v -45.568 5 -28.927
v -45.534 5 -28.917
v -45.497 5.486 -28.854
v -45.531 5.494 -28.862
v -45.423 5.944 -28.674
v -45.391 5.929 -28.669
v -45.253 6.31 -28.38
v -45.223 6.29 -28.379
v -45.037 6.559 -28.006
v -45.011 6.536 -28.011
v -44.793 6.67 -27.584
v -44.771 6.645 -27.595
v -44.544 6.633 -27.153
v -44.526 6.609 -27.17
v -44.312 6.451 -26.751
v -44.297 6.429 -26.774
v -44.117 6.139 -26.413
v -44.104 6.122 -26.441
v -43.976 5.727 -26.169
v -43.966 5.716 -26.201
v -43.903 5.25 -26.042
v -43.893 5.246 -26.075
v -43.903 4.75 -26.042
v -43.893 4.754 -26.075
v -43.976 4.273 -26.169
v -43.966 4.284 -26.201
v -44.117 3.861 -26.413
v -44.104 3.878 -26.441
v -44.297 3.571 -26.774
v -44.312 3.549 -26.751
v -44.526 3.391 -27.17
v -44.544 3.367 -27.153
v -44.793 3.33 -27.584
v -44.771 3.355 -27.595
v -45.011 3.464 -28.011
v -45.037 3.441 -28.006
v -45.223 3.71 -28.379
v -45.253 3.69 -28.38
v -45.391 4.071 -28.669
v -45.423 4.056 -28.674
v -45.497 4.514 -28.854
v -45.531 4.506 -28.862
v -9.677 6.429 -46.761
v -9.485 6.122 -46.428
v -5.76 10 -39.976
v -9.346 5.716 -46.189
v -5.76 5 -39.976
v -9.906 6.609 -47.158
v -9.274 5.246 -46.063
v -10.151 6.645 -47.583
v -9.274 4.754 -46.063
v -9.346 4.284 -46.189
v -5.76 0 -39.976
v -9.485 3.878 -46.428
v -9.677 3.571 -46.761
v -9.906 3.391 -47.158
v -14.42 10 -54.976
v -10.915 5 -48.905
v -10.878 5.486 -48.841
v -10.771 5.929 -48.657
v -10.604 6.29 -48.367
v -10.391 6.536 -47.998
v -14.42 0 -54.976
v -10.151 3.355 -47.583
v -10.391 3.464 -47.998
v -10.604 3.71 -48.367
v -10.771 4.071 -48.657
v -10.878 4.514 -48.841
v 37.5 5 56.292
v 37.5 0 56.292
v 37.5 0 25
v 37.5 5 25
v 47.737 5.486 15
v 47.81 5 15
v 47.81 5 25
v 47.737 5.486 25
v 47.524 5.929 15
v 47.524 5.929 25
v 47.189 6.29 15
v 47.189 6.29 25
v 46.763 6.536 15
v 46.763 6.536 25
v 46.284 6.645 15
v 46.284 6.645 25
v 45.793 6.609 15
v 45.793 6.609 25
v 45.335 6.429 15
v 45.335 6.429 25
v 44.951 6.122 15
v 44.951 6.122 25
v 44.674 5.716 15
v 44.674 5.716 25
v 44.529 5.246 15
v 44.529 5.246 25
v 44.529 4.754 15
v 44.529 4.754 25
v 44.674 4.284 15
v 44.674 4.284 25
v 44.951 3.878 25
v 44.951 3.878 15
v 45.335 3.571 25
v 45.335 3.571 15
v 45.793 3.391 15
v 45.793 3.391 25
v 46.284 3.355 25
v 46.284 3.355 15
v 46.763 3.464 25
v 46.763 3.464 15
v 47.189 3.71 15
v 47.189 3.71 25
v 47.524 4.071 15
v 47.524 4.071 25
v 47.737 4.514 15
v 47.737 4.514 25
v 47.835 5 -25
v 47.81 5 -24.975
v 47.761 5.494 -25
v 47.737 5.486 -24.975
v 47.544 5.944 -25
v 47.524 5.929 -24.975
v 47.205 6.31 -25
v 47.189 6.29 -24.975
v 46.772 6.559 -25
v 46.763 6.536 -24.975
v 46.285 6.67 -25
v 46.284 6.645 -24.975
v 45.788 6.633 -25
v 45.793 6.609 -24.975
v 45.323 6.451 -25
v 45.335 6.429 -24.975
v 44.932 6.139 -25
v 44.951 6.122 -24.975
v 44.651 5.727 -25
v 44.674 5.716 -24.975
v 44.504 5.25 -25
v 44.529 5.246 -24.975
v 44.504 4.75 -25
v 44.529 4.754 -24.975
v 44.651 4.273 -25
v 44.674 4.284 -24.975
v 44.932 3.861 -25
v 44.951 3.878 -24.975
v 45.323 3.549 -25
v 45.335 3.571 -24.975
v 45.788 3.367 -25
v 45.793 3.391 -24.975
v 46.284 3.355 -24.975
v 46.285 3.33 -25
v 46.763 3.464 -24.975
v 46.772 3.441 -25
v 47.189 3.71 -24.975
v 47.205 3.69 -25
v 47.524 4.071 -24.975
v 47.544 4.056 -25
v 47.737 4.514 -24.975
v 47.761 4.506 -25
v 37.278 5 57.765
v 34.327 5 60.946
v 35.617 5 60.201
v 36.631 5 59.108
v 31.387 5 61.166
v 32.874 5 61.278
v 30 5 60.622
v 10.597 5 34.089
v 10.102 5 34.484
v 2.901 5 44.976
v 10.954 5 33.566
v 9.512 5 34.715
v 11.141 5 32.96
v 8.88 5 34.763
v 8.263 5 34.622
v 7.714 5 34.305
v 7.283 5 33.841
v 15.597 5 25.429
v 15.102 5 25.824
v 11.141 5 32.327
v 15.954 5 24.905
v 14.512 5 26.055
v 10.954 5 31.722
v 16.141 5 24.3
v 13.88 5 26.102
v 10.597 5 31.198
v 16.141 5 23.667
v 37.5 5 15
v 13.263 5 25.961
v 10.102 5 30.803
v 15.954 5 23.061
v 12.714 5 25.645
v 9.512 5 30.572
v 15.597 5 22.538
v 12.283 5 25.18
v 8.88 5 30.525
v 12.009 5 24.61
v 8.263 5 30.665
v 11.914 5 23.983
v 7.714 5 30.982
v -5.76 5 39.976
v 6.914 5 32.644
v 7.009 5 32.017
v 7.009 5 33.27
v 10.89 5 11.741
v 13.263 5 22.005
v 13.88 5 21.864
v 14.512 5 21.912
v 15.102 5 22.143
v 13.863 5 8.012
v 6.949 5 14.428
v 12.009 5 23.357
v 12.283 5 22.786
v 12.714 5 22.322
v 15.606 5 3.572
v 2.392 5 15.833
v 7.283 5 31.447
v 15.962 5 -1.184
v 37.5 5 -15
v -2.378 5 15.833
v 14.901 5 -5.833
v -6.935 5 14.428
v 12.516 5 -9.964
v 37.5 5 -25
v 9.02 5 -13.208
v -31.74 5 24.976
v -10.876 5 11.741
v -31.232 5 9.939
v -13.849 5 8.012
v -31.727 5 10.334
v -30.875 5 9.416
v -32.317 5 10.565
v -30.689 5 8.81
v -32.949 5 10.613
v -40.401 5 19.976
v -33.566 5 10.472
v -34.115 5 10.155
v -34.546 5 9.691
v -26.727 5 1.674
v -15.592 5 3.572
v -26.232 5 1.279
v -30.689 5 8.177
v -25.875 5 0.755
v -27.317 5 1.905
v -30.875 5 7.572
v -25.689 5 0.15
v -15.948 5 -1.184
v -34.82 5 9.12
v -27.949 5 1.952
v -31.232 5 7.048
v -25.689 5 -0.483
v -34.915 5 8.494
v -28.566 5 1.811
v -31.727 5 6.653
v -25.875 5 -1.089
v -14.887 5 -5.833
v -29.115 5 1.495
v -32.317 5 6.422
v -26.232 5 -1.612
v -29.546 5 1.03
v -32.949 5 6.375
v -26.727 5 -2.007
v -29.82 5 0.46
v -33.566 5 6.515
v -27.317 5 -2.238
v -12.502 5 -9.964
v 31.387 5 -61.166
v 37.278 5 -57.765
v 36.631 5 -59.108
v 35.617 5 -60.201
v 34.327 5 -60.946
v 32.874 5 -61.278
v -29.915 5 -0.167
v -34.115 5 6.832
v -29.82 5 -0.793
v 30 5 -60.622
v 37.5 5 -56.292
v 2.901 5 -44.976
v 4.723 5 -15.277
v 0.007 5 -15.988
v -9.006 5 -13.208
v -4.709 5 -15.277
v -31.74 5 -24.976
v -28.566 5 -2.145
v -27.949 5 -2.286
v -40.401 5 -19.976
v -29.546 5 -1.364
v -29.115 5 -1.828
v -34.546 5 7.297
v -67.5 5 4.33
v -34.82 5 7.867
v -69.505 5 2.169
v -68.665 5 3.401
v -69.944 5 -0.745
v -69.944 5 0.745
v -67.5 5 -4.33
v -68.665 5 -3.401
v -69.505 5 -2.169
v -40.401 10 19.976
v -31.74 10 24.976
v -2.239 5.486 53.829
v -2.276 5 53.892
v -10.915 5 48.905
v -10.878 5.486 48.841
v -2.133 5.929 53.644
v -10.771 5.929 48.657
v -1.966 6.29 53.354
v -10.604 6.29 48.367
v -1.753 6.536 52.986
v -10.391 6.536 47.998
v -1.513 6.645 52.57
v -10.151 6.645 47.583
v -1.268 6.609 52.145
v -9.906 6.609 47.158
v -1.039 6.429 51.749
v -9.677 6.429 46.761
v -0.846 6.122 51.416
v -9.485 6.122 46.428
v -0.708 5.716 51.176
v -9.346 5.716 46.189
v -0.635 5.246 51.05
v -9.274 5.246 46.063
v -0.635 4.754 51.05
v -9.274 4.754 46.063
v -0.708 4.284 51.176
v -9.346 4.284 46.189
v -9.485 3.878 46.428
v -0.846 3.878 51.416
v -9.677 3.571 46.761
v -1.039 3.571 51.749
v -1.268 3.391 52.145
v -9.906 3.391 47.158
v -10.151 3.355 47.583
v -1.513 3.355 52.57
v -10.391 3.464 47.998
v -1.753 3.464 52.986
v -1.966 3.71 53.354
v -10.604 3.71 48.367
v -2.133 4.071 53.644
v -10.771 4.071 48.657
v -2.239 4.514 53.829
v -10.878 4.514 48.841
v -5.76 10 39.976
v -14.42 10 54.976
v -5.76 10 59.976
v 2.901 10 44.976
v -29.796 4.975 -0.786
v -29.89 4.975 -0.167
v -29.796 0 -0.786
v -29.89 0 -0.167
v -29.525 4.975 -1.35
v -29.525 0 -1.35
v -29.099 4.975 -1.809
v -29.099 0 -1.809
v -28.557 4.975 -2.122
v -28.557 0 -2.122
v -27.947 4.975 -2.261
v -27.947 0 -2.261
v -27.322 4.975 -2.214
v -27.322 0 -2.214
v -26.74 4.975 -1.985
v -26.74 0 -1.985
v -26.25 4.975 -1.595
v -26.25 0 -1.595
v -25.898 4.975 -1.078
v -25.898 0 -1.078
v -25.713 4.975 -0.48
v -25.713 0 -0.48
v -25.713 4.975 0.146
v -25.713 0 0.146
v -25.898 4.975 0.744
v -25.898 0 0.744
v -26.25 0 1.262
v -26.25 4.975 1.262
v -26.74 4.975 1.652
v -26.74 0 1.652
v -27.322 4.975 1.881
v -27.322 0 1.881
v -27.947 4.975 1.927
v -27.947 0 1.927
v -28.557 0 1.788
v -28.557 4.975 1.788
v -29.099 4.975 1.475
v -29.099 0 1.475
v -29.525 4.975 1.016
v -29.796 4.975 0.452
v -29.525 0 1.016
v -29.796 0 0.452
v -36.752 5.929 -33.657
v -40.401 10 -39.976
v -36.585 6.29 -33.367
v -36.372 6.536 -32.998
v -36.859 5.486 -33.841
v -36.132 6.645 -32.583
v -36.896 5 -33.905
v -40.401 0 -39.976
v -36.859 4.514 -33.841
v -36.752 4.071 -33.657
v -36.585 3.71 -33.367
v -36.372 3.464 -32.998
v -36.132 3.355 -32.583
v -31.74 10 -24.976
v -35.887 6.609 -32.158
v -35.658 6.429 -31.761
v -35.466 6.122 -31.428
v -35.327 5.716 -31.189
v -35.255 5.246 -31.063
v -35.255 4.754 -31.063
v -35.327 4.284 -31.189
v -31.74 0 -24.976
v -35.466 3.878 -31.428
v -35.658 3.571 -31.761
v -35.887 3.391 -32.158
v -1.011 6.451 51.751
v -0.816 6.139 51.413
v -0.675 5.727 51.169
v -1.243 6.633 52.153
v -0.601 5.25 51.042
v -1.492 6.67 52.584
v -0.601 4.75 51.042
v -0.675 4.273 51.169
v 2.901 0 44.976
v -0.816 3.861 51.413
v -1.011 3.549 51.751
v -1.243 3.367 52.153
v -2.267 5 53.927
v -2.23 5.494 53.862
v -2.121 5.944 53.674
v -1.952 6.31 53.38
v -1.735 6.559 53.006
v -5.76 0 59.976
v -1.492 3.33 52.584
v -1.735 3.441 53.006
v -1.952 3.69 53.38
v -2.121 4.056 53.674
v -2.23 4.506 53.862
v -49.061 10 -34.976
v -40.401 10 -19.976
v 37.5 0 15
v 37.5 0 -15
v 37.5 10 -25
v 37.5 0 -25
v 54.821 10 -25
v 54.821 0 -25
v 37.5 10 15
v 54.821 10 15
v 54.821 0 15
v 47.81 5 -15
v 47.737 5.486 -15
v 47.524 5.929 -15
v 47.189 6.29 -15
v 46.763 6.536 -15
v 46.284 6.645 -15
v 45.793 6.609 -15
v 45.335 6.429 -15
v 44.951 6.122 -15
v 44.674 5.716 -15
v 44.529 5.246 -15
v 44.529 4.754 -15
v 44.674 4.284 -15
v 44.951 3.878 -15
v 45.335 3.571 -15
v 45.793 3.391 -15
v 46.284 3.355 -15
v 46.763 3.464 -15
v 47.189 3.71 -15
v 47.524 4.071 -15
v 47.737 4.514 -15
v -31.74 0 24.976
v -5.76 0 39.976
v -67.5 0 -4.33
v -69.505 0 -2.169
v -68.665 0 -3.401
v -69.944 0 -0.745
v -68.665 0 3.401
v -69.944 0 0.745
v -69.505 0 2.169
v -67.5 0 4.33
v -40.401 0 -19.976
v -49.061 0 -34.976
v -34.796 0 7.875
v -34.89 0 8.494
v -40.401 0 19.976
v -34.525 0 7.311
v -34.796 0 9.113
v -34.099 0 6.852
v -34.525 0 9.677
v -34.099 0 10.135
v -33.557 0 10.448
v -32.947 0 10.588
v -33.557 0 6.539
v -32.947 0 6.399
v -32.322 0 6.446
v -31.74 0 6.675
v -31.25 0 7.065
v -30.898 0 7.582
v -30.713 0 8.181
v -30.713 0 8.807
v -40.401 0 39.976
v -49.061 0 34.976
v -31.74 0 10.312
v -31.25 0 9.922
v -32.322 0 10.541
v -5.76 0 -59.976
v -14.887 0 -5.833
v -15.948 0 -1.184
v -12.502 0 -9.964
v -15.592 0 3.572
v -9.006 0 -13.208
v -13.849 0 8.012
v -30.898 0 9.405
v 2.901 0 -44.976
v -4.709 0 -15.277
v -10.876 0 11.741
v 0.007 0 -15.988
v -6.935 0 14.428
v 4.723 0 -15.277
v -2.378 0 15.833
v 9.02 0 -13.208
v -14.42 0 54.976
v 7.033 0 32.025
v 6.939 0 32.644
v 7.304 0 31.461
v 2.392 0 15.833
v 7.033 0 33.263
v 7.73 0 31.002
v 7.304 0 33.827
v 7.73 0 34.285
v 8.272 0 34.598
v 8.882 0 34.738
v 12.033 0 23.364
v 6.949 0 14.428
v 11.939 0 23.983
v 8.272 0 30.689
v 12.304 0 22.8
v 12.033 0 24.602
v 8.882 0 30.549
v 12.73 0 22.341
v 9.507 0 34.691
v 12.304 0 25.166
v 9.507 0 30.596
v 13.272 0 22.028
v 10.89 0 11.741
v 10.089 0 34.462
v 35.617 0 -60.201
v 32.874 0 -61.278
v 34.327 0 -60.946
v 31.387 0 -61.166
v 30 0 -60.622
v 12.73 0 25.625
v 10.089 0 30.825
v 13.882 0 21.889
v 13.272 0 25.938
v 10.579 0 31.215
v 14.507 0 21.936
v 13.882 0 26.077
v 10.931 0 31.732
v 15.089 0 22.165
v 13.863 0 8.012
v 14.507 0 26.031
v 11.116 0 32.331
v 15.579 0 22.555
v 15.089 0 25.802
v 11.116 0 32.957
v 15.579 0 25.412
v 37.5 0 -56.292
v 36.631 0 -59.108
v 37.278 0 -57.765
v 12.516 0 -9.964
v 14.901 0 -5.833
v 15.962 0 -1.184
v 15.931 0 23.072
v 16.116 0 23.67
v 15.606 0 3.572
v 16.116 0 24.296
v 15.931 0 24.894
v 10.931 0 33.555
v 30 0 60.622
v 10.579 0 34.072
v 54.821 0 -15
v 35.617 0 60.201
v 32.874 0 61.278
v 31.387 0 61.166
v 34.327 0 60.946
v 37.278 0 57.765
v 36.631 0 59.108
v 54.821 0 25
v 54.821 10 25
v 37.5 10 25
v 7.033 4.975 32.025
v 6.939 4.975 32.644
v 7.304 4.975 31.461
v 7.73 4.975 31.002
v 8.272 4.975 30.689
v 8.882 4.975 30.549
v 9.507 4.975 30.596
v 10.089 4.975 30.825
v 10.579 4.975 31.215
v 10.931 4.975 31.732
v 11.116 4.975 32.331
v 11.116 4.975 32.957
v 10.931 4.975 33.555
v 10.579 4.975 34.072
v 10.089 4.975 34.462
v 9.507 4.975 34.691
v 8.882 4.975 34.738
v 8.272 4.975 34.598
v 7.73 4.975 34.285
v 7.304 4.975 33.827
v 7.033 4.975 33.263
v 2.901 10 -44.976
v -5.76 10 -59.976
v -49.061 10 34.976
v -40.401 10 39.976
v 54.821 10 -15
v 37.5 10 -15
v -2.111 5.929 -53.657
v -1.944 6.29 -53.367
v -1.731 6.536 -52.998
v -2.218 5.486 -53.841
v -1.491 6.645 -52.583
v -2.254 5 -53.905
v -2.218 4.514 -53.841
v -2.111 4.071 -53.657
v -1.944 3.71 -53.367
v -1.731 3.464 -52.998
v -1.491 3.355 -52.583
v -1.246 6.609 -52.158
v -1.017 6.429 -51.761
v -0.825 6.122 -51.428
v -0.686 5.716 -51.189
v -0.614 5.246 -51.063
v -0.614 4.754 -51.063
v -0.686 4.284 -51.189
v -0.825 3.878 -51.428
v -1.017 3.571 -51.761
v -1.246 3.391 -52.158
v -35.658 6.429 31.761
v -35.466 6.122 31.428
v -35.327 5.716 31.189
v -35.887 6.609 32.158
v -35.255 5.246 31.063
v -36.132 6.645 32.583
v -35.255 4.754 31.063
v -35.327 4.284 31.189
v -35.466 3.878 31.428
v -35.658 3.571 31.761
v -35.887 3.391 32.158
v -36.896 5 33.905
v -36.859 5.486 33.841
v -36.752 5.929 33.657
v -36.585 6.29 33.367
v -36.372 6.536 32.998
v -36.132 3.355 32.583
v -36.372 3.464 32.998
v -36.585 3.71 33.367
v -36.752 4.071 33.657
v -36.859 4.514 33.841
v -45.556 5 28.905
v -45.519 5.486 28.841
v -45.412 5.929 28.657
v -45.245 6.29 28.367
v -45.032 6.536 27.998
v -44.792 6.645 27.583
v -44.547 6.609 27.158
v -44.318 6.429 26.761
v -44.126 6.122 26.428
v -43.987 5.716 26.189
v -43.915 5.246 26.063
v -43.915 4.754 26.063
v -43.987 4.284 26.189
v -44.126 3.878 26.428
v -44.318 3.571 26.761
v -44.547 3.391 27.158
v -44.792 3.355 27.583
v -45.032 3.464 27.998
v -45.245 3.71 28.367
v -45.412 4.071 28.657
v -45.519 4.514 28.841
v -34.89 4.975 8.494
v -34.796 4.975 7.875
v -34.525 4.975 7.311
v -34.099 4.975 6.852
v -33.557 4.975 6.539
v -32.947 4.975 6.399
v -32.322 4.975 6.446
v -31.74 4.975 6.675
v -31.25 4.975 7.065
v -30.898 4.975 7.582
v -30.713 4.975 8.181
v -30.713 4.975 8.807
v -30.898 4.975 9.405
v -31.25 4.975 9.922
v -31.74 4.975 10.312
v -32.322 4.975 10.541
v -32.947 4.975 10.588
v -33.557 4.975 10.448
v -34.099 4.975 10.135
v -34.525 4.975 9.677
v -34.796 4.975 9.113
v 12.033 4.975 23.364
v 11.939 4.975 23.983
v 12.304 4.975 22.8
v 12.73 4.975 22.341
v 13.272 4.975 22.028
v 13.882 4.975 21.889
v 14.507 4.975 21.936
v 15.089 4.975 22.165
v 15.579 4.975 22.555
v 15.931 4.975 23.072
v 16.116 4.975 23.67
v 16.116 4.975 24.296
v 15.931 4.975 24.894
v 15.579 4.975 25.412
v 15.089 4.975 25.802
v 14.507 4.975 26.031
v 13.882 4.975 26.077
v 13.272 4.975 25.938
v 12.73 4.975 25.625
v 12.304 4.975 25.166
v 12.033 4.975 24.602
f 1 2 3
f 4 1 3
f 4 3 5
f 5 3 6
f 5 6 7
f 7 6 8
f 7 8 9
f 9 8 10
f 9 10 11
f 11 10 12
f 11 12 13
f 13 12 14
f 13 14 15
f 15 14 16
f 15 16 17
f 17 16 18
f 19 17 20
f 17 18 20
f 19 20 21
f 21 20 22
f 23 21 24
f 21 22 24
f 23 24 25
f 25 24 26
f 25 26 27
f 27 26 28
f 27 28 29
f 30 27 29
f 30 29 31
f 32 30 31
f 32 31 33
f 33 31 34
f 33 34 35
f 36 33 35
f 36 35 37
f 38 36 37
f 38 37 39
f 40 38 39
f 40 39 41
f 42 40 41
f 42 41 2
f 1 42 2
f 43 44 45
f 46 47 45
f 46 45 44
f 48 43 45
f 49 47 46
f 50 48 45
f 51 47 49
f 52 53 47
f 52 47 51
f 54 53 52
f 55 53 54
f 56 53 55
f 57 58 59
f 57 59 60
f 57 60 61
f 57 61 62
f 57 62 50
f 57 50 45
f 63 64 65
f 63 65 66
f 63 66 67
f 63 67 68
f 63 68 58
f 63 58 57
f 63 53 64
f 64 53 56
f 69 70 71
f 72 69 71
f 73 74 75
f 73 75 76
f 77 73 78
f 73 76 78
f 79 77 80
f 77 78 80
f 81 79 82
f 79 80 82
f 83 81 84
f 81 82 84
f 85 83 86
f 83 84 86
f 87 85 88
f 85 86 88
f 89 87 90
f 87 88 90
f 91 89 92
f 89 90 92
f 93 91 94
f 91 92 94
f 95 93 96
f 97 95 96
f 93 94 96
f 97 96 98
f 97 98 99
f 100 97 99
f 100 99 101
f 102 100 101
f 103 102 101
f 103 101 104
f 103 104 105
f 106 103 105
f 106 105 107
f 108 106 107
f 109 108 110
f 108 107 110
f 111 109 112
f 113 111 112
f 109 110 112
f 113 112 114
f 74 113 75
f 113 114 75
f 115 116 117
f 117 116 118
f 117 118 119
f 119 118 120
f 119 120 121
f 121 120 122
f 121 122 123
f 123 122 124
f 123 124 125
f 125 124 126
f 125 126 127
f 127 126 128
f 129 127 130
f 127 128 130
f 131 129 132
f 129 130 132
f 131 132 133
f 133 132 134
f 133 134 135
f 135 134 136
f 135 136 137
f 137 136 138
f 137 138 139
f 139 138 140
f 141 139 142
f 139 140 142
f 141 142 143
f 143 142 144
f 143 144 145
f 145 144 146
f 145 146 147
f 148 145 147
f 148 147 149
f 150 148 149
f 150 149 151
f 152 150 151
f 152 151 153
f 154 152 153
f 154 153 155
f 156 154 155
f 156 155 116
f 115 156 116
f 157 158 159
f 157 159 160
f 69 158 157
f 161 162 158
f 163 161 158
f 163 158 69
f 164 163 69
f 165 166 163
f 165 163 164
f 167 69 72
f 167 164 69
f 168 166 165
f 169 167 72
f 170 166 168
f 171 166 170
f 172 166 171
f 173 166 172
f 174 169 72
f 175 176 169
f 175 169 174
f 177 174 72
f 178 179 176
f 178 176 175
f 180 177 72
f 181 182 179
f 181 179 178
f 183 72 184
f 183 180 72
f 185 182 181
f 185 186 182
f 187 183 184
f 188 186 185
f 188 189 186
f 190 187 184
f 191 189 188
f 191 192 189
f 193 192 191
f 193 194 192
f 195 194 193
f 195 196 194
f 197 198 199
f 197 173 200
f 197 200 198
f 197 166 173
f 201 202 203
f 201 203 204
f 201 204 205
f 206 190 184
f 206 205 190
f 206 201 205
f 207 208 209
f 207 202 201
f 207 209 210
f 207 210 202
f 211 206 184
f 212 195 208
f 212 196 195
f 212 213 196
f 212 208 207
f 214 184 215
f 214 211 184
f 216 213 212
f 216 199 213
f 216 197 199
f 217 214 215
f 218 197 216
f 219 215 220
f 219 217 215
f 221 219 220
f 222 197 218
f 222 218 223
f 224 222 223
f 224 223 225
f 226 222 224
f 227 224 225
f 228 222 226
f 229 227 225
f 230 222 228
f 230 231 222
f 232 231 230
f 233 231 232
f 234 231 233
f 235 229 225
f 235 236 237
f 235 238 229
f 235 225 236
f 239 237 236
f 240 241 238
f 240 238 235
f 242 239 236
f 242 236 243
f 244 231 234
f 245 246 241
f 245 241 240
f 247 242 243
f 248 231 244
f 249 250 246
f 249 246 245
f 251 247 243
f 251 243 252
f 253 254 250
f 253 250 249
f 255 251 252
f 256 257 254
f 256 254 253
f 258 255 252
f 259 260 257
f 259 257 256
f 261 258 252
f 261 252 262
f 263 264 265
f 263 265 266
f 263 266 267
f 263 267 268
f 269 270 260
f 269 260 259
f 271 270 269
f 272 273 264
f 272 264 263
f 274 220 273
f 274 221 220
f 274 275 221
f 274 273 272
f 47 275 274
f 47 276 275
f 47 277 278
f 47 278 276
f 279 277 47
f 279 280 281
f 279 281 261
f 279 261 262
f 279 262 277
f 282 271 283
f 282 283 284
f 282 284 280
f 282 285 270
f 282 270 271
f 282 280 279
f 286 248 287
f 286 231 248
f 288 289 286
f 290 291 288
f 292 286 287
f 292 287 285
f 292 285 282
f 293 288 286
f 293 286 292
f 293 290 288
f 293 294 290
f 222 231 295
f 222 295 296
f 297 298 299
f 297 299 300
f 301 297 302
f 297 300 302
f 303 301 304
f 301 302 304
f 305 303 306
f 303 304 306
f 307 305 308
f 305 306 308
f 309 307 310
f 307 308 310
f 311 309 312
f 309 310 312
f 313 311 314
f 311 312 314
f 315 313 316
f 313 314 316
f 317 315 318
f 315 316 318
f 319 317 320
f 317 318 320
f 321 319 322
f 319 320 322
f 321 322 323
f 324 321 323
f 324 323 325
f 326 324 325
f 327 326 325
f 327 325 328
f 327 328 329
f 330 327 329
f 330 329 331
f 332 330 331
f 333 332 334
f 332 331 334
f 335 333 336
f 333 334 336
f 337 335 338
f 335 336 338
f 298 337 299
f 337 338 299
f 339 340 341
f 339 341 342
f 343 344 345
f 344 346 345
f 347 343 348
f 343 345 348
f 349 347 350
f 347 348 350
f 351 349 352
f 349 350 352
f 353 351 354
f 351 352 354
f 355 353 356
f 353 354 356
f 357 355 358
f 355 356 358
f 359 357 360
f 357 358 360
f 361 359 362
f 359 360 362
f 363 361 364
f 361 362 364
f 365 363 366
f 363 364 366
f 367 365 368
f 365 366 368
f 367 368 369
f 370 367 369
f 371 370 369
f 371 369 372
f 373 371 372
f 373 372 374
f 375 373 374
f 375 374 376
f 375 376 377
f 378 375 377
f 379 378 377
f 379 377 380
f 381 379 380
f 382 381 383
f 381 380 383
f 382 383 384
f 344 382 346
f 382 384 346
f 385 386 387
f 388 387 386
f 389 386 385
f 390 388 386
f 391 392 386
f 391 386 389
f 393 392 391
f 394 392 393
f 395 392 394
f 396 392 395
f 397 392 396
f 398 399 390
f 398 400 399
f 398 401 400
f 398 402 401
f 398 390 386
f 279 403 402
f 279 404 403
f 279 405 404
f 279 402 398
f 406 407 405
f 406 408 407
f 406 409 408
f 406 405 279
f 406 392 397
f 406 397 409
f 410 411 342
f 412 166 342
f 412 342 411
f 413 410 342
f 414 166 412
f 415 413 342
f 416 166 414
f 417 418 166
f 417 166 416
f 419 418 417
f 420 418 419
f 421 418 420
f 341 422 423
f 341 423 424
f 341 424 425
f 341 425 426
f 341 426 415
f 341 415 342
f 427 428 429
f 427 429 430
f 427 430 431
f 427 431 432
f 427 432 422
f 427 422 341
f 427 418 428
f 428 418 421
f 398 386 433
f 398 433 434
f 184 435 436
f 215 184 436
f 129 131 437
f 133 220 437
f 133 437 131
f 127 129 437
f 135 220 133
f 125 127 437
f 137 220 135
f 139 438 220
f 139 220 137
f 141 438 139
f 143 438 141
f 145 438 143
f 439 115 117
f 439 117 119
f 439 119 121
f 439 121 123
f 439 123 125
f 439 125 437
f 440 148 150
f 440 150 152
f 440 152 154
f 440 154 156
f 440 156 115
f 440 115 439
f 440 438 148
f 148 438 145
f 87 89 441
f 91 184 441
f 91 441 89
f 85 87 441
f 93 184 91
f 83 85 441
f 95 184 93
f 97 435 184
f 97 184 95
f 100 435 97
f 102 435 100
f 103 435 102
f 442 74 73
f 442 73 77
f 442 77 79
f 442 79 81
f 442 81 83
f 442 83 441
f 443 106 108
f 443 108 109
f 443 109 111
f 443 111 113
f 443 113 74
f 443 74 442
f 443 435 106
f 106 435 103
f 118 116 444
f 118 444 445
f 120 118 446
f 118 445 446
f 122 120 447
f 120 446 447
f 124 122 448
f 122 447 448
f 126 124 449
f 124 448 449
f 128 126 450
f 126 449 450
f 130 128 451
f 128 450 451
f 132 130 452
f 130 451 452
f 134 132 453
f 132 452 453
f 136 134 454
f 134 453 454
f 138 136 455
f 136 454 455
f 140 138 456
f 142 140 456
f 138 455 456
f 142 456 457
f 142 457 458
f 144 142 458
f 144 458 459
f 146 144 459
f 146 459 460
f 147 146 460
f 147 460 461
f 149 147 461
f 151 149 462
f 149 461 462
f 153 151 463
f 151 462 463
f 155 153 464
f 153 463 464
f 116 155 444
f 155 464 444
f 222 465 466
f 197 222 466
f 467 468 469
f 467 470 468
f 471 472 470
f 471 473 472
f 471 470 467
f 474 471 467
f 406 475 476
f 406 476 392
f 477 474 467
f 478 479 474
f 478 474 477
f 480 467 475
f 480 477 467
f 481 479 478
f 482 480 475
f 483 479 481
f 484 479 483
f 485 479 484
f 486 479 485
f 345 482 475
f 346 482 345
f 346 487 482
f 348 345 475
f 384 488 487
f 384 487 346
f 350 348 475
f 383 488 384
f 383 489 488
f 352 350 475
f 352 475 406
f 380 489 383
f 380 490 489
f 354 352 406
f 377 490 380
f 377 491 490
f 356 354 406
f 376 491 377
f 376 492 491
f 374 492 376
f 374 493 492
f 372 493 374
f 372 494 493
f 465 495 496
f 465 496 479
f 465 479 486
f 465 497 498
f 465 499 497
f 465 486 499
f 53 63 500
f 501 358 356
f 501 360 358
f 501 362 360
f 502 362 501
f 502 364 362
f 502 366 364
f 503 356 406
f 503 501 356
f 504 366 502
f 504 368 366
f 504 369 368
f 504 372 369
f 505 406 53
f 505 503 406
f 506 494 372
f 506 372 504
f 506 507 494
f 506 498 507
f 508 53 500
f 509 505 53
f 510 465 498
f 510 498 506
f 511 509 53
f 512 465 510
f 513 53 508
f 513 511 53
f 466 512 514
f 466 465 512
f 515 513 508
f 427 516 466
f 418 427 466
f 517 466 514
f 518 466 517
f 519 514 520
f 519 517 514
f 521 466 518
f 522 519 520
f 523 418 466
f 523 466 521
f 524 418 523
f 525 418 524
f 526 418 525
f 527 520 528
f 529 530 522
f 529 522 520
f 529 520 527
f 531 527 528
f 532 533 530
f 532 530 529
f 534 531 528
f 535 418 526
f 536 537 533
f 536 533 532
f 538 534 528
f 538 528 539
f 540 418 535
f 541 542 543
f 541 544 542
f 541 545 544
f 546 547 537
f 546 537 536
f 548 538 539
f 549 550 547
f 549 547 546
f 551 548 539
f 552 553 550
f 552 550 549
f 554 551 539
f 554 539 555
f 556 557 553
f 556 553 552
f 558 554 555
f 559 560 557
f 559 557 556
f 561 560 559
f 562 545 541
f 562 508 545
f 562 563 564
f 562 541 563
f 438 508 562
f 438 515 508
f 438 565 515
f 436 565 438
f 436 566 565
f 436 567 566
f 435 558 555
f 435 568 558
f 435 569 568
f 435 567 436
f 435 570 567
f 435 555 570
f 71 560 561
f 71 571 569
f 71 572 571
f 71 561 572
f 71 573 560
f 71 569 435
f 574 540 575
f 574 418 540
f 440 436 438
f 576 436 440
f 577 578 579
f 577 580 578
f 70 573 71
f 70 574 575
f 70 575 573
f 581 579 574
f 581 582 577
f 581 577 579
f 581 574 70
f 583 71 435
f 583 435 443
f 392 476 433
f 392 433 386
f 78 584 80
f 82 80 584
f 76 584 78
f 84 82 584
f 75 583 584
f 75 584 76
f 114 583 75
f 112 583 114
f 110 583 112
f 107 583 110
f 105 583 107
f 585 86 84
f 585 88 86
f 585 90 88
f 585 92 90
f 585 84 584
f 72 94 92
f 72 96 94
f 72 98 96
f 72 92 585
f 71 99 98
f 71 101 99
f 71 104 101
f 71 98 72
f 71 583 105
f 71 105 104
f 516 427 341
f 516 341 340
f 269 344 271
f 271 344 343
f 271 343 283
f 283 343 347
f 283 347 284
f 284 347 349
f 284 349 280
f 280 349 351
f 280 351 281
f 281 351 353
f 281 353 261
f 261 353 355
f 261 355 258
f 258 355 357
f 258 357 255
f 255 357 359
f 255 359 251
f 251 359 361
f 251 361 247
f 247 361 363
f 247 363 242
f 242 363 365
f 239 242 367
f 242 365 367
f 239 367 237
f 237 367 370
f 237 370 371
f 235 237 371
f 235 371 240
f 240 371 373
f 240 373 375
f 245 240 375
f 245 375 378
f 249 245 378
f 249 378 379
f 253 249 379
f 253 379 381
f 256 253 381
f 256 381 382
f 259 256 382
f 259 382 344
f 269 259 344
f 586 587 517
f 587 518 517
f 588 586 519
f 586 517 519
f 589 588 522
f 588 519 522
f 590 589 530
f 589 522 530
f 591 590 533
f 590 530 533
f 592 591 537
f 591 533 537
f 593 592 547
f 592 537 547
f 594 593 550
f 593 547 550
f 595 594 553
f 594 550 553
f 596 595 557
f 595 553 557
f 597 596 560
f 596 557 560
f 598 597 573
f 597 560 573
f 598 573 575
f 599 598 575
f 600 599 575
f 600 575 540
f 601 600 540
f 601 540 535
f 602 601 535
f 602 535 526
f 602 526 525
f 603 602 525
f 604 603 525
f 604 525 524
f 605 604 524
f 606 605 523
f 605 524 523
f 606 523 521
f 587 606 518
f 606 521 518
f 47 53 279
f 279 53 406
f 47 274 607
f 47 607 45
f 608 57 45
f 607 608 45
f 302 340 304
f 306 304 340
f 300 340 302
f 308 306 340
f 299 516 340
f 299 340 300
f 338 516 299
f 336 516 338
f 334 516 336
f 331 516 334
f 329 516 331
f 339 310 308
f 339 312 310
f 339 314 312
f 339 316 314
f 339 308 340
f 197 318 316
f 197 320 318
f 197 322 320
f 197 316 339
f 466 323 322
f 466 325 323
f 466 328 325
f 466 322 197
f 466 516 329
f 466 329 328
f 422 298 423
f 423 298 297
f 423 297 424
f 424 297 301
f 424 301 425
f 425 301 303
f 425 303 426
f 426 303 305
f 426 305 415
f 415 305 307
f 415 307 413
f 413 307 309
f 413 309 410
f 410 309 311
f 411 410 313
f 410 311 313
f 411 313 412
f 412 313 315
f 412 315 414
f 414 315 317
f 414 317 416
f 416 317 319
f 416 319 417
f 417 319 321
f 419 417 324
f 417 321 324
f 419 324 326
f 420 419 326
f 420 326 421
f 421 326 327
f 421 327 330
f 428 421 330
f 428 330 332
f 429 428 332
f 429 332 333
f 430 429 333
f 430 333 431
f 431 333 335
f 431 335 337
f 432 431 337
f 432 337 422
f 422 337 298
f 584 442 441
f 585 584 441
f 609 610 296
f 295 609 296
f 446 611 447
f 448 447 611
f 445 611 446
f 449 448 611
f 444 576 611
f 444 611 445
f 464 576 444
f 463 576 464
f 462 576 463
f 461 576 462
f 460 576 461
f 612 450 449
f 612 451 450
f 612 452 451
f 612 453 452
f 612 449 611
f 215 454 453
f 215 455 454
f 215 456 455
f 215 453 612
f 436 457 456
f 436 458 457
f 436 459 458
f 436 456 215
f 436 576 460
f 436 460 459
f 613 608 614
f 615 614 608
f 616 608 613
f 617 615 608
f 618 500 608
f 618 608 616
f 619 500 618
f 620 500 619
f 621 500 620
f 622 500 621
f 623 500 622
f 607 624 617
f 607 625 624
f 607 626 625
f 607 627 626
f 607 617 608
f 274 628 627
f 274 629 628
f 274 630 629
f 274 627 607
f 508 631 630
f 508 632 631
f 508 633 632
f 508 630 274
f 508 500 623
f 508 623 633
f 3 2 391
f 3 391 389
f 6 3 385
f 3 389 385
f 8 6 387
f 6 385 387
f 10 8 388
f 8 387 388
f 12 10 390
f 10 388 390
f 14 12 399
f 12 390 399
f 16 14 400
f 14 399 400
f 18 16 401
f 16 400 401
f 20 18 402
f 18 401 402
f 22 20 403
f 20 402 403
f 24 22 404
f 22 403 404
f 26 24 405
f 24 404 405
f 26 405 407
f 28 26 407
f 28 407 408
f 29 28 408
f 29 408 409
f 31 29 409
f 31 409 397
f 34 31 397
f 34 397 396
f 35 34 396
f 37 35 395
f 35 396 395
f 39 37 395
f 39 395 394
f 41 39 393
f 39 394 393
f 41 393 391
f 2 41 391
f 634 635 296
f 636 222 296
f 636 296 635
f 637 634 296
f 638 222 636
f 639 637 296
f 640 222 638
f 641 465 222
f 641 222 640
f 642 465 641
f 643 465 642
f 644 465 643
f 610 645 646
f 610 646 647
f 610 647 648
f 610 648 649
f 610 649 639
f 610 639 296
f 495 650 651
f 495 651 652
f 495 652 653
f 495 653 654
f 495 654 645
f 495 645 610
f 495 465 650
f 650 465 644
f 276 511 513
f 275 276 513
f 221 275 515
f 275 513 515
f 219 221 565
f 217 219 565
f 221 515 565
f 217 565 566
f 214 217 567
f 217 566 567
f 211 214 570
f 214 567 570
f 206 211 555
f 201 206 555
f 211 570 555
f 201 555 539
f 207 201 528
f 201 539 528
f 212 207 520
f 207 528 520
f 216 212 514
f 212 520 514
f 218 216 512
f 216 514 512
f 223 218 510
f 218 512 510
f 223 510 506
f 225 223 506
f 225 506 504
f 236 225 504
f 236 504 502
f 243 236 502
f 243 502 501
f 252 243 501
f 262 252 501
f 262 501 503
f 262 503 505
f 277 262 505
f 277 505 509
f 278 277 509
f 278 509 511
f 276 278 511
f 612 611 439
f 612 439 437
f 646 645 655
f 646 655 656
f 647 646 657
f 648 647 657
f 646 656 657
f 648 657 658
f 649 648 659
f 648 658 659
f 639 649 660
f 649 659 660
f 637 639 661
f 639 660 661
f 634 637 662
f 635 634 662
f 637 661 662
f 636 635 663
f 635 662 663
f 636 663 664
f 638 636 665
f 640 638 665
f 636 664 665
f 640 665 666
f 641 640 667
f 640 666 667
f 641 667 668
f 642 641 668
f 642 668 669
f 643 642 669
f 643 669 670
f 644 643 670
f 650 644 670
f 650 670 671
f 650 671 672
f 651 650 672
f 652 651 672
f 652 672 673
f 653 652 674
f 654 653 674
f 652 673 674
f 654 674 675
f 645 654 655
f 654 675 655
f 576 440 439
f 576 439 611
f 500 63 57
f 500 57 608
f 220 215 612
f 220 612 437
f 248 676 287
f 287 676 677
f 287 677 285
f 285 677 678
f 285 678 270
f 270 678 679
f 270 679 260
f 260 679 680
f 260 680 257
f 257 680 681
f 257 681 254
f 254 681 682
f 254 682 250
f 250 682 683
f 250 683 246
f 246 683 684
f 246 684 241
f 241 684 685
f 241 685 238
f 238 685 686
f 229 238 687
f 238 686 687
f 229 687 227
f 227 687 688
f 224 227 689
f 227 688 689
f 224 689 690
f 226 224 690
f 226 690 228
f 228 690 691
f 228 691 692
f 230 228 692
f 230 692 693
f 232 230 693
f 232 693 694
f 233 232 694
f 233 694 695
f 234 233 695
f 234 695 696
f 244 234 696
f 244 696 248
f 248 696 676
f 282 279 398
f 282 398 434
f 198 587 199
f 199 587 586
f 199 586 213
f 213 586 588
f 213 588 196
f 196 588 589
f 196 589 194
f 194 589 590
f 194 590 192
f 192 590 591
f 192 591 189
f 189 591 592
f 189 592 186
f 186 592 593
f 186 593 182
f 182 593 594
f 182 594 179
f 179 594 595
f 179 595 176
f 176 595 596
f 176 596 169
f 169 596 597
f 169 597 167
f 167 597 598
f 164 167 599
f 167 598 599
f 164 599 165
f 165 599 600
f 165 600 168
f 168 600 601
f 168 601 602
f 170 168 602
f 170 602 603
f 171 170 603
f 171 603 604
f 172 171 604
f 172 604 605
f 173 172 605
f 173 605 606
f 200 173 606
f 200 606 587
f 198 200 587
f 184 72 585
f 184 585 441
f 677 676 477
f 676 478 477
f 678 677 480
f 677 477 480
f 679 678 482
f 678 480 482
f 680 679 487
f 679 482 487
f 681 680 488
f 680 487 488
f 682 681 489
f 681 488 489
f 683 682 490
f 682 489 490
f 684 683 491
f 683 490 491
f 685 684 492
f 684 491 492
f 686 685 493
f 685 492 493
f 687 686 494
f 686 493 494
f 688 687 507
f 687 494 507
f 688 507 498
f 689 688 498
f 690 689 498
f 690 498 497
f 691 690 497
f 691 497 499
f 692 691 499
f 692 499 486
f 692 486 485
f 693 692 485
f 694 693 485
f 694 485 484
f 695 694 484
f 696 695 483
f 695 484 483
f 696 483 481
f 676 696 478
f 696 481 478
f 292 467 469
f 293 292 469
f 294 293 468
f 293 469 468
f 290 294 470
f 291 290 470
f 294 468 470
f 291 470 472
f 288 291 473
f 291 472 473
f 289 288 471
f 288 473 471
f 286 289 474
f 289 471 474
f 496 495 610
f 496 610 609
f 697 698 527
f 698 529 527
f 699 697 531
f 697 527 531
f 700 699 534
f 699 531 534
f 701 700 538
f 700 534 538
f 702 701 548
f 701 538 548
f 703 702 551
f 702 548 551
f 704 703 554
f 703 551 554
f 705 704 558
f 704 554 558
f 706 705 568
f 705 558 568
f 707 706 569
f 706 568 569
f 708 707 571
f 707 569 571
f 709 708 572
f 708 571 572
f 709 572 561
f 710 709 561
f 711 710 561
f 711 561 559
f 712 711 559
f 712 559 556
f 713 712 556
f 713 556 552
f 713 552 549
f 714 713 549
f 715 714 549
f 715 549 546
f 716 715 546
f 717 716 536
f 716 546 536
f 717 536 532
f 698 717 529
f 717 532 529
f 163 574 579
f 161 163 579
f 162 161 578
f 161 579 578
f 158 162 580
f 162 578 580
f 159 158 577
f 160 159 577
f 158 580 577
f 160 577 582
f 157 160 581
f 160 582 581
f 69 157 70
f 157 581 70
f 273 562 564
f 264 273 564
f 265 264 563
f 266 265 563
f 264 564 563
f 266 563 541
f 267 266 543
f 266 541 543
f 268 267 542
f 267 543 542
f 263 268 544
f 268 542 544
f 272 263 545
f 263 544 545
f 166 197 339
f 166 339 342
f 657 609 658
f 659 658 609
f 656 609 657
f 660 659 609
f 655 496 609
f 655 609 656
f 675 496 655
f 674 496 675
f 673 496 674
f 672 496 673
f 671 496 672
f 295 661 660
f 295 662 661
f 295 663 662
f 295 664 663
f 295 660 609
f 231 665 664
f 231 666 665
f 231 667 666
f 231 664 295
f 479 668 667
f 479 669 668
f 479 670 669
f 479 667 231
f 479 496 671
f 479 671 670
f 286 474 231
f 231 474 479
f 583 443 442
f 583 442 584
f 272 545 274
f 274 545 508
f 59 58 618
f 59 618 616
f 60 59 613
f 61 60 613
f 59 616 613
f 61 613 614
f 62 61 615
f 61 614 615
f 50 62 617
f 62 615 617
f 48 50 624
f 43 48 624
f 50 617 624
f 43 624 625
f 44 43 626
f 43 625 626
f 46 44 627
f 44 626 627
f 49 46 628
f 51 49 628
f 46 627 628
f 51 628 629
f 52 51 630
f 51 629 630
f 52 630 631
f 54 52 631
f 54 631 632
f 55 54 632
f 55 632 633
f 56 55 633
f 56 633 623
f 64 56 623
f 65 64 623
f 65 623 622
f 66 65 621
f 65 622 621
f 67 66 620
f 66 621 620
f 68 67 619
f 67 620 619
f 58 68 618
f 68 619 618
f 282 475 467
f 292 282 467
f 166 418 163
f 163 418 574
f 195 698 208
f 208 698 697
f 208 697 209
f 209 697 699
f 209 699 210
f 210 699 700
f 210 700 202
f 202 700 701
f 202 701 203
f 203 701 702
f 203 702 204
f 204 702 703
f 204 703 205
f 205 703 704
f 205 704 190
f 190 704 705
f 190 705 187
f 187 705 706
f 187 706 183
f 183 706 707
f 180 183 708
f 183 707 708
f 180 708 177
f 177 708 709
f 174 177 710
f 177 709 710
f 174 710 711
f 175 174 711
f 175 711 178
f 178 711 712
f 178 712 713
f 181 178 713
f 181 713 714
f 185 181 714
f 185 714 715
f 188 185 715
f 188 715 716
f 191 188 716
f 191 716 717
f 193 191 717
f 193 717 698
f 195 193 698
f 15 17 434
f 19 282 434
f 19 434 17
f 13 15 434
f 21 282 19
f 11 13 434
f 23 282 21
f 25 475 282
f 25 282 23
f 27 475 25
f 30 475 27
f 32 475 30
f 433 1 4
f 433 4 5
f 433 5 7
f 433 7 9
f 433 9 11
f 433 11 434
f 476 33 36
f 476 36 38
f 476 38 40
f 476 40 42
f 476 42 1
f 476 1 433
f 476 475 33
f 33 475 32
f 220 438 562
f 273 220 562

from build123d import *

# Parameters (mm, degrees)
BOSS_EXTRUDE1_DEPTH               = 5
BOSS_EXTRUDE3_DEPTH               = 10
TAP_DRILL_FOR_M4_TAP1_D           = 3.3
TAP_DRILL_FOR_M4_TAP1_CSINK_D     = 3.35
TAP_DRILL_FOR_M4_TAP1_CSINK_ANGLE = 90
CIRPATTERN1_COUNT                 = 3
SKETCH13_R                        = 16
CUT_EXTRUDE1_DEPTH                = 94.577061893
TAP_DRILL_FOR_M5_TAP1_D           = 4.2
TAP_DRILL_FOR_M5_TAP1_CSINK_D     = 4.25
TAP_DRILL_FOR_M5_TAP1_CSINK_ANGLE = 90


with BuildPart() as part:
    # Sketch2 → Boss-Extrude1 (new body)
    with BuildSketch(Plane(origin=(0, 0, 0), x_dir=(0, 0, -1), z_dir=(0, 1, 0))):
        with BuildLine():
            Line((4.330127019, 67.5), (19.975952642, 40.400635095))
            Line((19.975952642, 40.400635095), (24.975952642, 31.740381057))
            Line((24.975952642, 31.740381057), (39.975952642, 5.759618943))
            Line((39.975952642, 5.759618943), (44.975952642, -2.900635095))
            Line((44.975952642, -2.900635095), (60.621778265, -30))
            ThreePointArc((60.621778265, -30), (60.621778265, -35), (56.291651246, -37.5))
            Line((56.291651246, -37.5), (25, -37.5))
            Line((25, -37.5), (15, -37.5))
            Line((15, -37.5), (-15, -37.5))
            Line((-15, -37.5), (-25, -37.5))
            Line((-25, -37.5), (-56.291651246, -37.5))
            ThreePointArc((-56.291651246, -37.5), (-60.621778265, -35), (-60.621778265, -30))
            Line((-60.621778265, -30), (-44.975952642, -2.900635095))
            Line((-44.975952642, -2.900635095), (-39.975952642, 5.759618943))
            Line((-39.975952642, 5.759618943), (-24.975952642, 31.740381057))
            Line((-24.975952642, 31.740381057), (-19.975952642, 40.400635095))
            Line((-19.975952642, 40.400635095), (-4.330127019, 67.5))
            ThreePointArc((-4.330127019, 67.5), (0, 70), (4.330127019, 67.5))
        make_face()
    extrude(amount=BOSS_EXTRUDE1_DEPTH)

    # Sketch2<7> → Boss-Extrude3 (add)
    with BuildSketch(Plane(origin=(0, 0, 0), x_dir=(0, 0, -1), z_dir=(0, 1, 0))):
        Polygon((34.975952642, 49.060889132), (19.975952642, 40.400635095), (24.975952642, 31.740381057), (39.975952642, 40.400635095), align=None)
        Polygon((39.975952642, 5.759618943), (44.975952642, -2.900635095), (59.975952642, 5.759618943), (54.975952642, 14.419872981), align=None)
    boss_extrude3 = extrude(amount=BOSS_EXTRUDE3_DEPTH)

    # Tap Drill for M4 Tap1 (through all)
    with Locations(Plane(origin=(-21.650635095, 0, 12.5), x_dir=(0.49999999999999517, 0, 0.8660254037844415), z_dir=(-0.8660254037844414, 0, 0.4999999999999951))):
        with Locations((-46.160254038, 5)):
            tap_drill_for_m4_tap1 = CounterSinkHole(TAP_DRILL_FOR_M4_TAP1_D / 2, TAP_DRILL_FOR_M4_TAP1_CSINK_D / 2, counter_sink_angle=TAP_DRILL_FOR_M4_TAP1_CSINK_ANGLE)

    # CirPattern1: Boss-Extrude3, Tap Drill for M4 Tap1 ×3 about axis
    cirpattern1_axis = Axis((0, 5, 0), (0, 1, 0))
    add([boss_extrude3.rotate(cirpattern1_axis, i * 360 / CIRPATTERN1_COUNT) for i in range(1, CIRPATTERN1_COUNT)])
    add([tap_drill_for_m4_tap1.rotate(cirpattern1_axis, i * 360 / CIRPATTERN1_COUNT) for i in range(1, CIRPATTERN1_COUNT)], mode=Mode.SUBTRACT)

    # Sketch13 → Cut-Extrude1 (cut, through all)
    with BuildSketch(Plane.XZ):
        with Locations((0.00701443, 0.012149349)):
            Circle(SKETCH13_R)
    extrude(amount=-CUT_EXTRUDE1_DEPTH, mode=Mode.SUBTRACT)

    # Tap Drill for M5 Tap1 (through all)
    with Locations(Plane(origin=(0, 5, 0), x_dir=(1, 0, 0), z_dir=(0, 1, 0))):
        with Locations((-27.789778361, 0.166691947), (-32.789778361, -8.49356209), (14.039248642, -23.983308053), (9.039248642, -32.64356209)):
            CounterSinkHole(TAP_DRILL_FOR_M5_TAP1_D / 2, TAP_DRILL_FOR_M5_TAP1_CSINK_D / 2, counter_sink_angle=TAP_DRILL_FOR_M5_TAP1_CSINK_ANGLE)


solid = part.part
